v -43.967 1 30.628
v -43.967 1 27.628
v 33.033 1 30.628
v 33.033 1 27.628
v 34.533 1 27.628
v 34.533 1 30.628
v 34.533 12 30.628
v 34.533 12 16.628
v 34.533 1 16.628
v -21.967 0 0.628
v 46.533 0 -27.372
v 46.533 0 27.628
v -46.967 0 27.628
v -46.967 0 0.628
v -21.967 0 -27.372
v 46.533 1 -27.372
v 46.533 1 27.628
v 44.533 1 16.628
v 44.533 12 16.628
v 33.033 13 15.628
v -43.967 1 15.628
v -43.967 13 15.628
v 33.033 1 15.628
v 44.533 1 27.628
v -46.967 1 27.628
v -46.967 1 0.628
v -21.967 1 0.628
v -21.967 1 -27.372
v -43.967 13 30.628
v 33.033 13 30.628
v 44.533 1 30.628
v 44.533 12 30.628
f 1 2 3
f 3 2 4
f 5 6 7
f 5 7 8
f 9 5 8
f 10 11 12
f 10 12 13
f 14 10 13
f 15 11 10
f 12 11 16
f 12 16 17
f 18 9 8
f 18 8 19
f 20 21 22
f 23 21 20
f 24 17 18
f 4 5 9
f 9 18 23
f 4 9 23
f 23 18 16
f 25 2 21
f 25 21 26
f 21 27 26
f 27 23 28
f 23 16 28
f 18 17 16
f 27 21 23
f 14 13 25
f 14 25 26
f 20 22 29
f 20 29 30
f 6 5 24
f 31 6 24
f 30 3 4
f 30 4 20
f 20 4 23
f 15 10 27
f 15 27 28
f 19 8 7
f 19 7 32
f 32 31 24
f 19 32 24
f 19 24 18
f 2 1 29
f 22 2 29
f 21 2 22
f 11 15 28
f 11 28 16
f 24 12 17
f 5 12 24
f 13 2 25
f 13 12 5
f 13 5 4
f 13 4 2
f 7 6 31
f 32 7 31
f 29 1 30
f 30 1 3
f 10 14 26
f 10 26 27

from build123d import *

# Parameters (mm, degrees)
BOSS_EXTRUDE1_DEPTH = 1
SKETCH2_W           = 77
SKETCH2_H           = 15
BOSS_EXTRUDE2_DEPTH = 12
SKETCH3_W           = 10
SKETCH3_H           = 14
BOSS_EXTRUDE3_DEPTH = 11


with BuildPart() as part:
    # Sketch1 → Boss-Extrude1 (new body)
    with BuildSketch(Plane(origin=(0, 0, 0), x_dir=(1, 0, 0), z_dir=(0, 1, 0))):
        Polygon((-46.9670263, -0.627662529), (-21.9670263, -0.627662529), (-21.9670263, 27.372337471), (46.5329737, 27.372337471), (46.5329737, -27.627662529), (-46.9670263, -27.627662529), align=None)
    extrude(amount=BOSS_EXTRUDE1_DEPTH)

    # Sketch2 → Boss-Extrude2 (add)
    with BuildSketch(Plane(origin=(0, 1, 0), x_dir=(1, 0, 0), z_dir=(0, 1, 0))):
        with Locations((-5.4670263, -23.127662529)):
            Rectangle(SKETCH2_W, SKETCH2_H)
    extrude(amount=BOSS_EXTRUDE2_DEPTH)

    # Sketch3 → Boss-Extrude3 (add)
    with BuildSketch(Plane(origin=(0, 1, 0), x_dir=(1, 0, 0), z_dir=(0, 1, 0))):
        with Locations((39.5329737, -23.627662529)):
            Rectangle(SKETCH3_W, SKETCH3_H)
    extrude(amount=BOSS_EXTRUDE3_DEPTH)


solid = part.part
